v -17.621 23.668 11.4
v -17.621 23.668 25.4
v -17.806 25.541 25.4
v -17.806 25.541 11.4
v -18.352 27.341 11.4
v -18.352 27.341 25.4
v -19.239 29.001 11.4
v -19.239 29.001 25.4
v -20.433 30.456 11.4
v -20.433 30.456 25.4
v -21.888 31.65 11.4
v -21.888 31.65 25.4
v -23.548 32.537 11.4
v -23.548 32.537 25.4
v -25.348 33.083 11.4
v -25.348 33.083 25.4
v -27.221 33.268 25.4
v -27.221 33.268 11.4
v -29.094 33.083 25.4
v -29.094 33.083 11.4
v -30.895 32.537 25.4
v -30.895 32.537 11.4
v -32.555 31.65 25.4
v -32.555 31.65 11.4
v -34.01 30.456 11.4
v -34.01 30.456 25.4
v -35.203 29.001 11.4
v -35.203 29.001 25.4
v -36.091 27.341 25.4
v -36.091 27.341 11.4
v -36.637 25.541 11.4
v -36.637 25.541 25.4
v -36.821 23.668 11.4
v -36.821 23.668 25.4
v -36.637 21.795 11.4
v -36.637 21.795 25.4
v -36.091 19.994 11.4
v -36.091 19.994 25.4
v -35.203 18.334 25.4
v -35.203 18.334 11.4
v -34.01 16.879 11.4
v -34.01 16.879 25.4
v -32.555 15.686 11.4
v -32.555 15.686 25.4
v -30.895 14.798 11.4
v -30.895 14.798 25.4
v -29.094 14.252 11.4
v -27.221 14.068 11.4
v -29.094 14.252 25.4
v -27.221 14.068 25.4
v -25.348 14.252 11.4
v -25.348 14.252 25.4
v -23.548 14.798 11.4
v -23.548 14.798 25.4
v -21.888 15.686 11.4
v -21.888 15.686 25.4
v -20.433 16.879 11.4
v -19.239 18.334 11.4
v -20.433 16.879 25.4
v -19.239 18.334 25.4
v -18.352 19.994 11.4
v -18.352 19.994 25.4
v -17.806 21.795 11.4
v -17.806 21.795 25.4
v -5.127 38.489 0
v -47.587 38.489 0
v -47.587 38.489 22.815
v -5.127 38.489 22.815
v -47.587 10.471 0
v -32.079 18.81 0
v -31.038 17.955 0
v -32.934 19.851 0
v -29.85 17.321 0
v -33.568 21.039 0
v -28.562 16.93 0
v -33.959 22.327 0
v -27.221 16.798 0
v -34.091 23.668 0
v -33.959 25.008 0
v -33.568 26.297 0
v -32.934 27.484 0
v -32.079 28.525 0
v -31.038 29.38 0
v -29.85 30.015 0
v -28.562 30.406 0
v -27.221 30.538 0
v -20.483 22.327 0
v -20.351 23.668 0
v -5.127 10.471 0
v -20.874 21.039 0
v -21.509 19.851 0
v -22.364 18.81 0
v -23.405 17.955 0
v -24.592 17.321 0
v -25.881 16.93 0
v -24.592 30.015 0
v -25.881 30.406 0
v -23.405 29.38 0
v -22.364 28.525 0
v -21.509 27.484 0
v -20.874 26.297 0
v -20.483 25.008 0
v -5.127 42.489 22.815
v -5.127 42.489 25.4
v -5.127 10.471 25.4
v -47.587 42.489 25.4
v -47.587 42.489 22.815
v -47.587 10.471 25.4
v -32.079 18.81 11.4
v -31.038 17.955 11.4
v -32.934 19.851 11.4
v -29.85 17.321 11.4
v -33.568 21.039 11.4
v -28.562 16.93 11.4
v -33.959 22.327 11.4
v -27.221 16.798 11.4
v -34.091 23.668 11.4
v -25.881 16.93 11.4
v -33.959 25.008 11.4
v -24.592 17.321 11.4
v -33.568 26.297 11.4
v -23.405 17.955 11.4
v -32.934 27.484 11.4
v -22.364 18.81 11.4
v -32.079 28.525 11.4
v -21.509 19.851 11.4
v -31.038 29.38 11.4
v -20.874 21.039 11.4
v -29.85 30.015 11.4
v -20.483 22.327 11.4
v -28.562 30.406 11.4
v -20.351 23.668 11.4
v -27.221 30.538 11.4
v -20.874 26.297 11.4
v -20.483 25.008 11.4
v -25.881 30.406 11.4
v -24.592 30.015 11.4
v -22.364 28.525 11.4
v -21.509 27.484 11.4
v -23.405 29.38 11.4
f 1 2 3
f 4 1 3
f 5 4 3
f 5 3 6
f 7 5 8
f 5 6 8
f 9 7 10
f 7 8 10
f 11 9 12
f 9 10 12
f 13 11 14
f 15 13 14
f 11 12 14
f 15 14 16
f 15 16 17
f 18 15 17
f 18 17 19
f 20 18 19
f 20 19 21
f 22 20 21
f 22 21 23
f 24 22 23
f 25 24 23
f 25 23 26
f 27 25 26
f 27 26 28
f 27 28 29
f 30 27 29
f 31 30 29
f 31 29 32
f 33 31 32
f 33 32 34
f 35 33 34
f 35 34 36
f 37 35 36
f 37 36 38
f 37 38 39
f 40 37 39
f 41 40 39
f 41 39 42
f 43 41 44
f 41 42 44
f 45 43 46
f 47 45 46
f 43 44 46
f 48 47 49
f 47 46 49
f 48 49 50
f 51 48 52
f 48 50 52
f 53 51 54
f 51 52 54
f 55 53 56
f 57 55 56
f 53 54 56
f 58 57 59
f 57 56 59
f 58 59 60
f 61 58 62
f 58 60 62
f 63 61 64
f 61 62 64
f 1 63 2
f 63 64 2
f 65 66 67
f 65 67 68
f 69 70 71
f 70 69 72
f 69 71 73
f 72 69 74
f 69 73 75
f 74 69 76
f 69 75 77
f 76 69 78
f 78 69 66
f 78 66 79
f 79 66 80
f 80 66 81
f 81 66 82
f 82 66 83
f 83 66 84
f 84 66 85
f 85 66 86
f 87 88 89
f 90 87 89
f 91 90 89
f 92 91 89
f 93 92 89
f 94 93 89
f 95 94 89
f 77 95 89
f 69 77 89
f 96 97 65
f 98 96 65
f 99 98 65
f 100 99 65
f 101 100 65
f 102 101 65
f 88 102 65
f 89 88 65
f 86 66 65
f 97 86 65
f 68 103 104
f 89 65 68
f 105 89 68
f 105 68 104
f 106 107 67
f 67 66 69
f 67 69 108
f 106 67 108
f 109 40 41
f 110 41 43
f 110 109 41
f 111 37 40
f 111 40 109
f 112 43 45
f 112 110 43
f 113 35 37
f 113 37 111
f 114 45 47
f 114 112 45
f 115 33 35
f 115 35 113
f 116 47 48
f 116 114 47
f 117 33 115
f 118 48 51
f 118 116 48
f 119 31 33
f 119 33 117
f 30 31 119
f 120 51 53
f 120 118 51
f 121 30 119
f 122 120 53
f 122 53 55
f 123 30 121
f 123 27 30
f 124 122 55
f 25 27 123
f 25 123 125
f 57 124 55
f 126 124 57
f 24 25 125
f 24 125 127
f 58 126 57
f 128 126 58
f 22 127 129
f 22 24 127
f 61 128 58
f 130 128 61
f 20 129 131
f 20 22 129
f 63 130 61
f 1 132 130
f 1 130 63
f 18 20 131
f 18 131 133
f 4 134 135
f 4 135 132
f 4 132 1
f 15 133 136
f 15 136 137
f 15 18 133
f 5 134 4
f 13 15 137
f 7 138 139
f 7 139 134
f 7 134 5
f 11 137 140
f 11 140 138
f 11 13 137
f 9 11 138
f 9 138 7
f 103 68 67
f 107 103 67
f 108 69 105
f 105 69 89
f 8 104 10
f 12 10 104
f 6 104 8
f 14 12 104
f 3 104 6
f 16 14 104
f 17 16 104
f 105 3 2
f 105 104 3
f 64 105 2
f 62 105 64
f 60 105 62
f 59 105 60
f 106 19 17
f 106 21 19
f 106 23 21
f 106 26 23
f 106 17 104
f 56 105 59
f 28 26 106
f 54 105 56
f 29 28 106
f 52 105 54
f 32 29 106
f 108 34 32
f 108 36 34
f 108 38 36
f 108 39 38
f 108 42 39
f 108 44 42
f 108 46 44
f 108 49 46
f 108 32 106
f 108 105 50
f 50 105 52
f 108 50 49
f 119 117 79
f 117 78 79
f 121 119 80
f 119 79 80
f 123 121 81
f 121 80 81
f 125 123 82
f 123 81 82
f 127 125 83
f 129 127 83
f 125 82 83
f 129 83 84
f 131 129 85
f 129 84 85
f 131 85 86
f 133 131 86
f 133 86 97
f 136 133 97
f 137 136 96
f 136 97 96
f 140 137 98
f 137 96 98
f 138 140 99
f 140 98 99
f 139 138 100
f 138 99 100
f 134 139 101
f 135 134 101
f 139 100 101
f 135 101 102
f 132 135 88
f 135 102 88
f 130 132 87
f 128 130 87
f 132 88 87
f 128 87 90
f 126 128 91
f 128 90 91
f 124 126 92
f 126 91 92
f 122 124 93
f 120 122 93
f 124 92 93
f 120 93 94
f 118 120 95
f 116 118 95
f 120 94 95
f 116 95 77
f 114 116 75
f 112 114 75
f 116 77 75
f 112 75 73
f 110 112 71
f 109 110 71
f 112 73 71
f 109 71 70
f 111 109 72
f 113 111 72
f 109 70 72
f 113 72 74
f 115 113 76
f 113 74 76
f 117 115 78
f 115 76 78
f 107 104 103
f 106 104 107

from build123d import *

# Parameters (mm, degrees)
F0_W           = 42.460177
F0_H           = 28.017944
F1_DEPTH       = 25.4
F3_D           = 13.74
F3_CBORE_D     = 19.2
F3_CBORE_DEPTH = 14
F4_W           = 42.460177
F4_H           = 2.585244
F5_DEPTH       = 4


with BuildPart() as f1:
    # F0 (on Top) → F1 (new body)
    with BuildSketch(Plane.XY):
        with Locations((-26.357082, 24.479595)):
            Rectangle(F0_W, F0_H)
    extrude(amount=F1_DEPTH)

    # F3 (through all)
    with Locations(Plane.XY.offset(25.4)):
        with Locations((-27.221344, 23.667647)):
            CounterBoreHole(F3_D / 2, F3_CBORE_D / 2, F3_CBORE_DEPTH)

    # F4 (on face) → F5 (join)
    with BuildSketch(Plane(origin=(0, 38.488567, 0), x_dir=(-1, 0, 0), z_dir=(0, 1, 0))):
        with Locations((26.357082, 24.107378)):
            Rectangle(F4_W, F4_H)
    extrude(amount=F5_DEPTH)


solid = f1.part
